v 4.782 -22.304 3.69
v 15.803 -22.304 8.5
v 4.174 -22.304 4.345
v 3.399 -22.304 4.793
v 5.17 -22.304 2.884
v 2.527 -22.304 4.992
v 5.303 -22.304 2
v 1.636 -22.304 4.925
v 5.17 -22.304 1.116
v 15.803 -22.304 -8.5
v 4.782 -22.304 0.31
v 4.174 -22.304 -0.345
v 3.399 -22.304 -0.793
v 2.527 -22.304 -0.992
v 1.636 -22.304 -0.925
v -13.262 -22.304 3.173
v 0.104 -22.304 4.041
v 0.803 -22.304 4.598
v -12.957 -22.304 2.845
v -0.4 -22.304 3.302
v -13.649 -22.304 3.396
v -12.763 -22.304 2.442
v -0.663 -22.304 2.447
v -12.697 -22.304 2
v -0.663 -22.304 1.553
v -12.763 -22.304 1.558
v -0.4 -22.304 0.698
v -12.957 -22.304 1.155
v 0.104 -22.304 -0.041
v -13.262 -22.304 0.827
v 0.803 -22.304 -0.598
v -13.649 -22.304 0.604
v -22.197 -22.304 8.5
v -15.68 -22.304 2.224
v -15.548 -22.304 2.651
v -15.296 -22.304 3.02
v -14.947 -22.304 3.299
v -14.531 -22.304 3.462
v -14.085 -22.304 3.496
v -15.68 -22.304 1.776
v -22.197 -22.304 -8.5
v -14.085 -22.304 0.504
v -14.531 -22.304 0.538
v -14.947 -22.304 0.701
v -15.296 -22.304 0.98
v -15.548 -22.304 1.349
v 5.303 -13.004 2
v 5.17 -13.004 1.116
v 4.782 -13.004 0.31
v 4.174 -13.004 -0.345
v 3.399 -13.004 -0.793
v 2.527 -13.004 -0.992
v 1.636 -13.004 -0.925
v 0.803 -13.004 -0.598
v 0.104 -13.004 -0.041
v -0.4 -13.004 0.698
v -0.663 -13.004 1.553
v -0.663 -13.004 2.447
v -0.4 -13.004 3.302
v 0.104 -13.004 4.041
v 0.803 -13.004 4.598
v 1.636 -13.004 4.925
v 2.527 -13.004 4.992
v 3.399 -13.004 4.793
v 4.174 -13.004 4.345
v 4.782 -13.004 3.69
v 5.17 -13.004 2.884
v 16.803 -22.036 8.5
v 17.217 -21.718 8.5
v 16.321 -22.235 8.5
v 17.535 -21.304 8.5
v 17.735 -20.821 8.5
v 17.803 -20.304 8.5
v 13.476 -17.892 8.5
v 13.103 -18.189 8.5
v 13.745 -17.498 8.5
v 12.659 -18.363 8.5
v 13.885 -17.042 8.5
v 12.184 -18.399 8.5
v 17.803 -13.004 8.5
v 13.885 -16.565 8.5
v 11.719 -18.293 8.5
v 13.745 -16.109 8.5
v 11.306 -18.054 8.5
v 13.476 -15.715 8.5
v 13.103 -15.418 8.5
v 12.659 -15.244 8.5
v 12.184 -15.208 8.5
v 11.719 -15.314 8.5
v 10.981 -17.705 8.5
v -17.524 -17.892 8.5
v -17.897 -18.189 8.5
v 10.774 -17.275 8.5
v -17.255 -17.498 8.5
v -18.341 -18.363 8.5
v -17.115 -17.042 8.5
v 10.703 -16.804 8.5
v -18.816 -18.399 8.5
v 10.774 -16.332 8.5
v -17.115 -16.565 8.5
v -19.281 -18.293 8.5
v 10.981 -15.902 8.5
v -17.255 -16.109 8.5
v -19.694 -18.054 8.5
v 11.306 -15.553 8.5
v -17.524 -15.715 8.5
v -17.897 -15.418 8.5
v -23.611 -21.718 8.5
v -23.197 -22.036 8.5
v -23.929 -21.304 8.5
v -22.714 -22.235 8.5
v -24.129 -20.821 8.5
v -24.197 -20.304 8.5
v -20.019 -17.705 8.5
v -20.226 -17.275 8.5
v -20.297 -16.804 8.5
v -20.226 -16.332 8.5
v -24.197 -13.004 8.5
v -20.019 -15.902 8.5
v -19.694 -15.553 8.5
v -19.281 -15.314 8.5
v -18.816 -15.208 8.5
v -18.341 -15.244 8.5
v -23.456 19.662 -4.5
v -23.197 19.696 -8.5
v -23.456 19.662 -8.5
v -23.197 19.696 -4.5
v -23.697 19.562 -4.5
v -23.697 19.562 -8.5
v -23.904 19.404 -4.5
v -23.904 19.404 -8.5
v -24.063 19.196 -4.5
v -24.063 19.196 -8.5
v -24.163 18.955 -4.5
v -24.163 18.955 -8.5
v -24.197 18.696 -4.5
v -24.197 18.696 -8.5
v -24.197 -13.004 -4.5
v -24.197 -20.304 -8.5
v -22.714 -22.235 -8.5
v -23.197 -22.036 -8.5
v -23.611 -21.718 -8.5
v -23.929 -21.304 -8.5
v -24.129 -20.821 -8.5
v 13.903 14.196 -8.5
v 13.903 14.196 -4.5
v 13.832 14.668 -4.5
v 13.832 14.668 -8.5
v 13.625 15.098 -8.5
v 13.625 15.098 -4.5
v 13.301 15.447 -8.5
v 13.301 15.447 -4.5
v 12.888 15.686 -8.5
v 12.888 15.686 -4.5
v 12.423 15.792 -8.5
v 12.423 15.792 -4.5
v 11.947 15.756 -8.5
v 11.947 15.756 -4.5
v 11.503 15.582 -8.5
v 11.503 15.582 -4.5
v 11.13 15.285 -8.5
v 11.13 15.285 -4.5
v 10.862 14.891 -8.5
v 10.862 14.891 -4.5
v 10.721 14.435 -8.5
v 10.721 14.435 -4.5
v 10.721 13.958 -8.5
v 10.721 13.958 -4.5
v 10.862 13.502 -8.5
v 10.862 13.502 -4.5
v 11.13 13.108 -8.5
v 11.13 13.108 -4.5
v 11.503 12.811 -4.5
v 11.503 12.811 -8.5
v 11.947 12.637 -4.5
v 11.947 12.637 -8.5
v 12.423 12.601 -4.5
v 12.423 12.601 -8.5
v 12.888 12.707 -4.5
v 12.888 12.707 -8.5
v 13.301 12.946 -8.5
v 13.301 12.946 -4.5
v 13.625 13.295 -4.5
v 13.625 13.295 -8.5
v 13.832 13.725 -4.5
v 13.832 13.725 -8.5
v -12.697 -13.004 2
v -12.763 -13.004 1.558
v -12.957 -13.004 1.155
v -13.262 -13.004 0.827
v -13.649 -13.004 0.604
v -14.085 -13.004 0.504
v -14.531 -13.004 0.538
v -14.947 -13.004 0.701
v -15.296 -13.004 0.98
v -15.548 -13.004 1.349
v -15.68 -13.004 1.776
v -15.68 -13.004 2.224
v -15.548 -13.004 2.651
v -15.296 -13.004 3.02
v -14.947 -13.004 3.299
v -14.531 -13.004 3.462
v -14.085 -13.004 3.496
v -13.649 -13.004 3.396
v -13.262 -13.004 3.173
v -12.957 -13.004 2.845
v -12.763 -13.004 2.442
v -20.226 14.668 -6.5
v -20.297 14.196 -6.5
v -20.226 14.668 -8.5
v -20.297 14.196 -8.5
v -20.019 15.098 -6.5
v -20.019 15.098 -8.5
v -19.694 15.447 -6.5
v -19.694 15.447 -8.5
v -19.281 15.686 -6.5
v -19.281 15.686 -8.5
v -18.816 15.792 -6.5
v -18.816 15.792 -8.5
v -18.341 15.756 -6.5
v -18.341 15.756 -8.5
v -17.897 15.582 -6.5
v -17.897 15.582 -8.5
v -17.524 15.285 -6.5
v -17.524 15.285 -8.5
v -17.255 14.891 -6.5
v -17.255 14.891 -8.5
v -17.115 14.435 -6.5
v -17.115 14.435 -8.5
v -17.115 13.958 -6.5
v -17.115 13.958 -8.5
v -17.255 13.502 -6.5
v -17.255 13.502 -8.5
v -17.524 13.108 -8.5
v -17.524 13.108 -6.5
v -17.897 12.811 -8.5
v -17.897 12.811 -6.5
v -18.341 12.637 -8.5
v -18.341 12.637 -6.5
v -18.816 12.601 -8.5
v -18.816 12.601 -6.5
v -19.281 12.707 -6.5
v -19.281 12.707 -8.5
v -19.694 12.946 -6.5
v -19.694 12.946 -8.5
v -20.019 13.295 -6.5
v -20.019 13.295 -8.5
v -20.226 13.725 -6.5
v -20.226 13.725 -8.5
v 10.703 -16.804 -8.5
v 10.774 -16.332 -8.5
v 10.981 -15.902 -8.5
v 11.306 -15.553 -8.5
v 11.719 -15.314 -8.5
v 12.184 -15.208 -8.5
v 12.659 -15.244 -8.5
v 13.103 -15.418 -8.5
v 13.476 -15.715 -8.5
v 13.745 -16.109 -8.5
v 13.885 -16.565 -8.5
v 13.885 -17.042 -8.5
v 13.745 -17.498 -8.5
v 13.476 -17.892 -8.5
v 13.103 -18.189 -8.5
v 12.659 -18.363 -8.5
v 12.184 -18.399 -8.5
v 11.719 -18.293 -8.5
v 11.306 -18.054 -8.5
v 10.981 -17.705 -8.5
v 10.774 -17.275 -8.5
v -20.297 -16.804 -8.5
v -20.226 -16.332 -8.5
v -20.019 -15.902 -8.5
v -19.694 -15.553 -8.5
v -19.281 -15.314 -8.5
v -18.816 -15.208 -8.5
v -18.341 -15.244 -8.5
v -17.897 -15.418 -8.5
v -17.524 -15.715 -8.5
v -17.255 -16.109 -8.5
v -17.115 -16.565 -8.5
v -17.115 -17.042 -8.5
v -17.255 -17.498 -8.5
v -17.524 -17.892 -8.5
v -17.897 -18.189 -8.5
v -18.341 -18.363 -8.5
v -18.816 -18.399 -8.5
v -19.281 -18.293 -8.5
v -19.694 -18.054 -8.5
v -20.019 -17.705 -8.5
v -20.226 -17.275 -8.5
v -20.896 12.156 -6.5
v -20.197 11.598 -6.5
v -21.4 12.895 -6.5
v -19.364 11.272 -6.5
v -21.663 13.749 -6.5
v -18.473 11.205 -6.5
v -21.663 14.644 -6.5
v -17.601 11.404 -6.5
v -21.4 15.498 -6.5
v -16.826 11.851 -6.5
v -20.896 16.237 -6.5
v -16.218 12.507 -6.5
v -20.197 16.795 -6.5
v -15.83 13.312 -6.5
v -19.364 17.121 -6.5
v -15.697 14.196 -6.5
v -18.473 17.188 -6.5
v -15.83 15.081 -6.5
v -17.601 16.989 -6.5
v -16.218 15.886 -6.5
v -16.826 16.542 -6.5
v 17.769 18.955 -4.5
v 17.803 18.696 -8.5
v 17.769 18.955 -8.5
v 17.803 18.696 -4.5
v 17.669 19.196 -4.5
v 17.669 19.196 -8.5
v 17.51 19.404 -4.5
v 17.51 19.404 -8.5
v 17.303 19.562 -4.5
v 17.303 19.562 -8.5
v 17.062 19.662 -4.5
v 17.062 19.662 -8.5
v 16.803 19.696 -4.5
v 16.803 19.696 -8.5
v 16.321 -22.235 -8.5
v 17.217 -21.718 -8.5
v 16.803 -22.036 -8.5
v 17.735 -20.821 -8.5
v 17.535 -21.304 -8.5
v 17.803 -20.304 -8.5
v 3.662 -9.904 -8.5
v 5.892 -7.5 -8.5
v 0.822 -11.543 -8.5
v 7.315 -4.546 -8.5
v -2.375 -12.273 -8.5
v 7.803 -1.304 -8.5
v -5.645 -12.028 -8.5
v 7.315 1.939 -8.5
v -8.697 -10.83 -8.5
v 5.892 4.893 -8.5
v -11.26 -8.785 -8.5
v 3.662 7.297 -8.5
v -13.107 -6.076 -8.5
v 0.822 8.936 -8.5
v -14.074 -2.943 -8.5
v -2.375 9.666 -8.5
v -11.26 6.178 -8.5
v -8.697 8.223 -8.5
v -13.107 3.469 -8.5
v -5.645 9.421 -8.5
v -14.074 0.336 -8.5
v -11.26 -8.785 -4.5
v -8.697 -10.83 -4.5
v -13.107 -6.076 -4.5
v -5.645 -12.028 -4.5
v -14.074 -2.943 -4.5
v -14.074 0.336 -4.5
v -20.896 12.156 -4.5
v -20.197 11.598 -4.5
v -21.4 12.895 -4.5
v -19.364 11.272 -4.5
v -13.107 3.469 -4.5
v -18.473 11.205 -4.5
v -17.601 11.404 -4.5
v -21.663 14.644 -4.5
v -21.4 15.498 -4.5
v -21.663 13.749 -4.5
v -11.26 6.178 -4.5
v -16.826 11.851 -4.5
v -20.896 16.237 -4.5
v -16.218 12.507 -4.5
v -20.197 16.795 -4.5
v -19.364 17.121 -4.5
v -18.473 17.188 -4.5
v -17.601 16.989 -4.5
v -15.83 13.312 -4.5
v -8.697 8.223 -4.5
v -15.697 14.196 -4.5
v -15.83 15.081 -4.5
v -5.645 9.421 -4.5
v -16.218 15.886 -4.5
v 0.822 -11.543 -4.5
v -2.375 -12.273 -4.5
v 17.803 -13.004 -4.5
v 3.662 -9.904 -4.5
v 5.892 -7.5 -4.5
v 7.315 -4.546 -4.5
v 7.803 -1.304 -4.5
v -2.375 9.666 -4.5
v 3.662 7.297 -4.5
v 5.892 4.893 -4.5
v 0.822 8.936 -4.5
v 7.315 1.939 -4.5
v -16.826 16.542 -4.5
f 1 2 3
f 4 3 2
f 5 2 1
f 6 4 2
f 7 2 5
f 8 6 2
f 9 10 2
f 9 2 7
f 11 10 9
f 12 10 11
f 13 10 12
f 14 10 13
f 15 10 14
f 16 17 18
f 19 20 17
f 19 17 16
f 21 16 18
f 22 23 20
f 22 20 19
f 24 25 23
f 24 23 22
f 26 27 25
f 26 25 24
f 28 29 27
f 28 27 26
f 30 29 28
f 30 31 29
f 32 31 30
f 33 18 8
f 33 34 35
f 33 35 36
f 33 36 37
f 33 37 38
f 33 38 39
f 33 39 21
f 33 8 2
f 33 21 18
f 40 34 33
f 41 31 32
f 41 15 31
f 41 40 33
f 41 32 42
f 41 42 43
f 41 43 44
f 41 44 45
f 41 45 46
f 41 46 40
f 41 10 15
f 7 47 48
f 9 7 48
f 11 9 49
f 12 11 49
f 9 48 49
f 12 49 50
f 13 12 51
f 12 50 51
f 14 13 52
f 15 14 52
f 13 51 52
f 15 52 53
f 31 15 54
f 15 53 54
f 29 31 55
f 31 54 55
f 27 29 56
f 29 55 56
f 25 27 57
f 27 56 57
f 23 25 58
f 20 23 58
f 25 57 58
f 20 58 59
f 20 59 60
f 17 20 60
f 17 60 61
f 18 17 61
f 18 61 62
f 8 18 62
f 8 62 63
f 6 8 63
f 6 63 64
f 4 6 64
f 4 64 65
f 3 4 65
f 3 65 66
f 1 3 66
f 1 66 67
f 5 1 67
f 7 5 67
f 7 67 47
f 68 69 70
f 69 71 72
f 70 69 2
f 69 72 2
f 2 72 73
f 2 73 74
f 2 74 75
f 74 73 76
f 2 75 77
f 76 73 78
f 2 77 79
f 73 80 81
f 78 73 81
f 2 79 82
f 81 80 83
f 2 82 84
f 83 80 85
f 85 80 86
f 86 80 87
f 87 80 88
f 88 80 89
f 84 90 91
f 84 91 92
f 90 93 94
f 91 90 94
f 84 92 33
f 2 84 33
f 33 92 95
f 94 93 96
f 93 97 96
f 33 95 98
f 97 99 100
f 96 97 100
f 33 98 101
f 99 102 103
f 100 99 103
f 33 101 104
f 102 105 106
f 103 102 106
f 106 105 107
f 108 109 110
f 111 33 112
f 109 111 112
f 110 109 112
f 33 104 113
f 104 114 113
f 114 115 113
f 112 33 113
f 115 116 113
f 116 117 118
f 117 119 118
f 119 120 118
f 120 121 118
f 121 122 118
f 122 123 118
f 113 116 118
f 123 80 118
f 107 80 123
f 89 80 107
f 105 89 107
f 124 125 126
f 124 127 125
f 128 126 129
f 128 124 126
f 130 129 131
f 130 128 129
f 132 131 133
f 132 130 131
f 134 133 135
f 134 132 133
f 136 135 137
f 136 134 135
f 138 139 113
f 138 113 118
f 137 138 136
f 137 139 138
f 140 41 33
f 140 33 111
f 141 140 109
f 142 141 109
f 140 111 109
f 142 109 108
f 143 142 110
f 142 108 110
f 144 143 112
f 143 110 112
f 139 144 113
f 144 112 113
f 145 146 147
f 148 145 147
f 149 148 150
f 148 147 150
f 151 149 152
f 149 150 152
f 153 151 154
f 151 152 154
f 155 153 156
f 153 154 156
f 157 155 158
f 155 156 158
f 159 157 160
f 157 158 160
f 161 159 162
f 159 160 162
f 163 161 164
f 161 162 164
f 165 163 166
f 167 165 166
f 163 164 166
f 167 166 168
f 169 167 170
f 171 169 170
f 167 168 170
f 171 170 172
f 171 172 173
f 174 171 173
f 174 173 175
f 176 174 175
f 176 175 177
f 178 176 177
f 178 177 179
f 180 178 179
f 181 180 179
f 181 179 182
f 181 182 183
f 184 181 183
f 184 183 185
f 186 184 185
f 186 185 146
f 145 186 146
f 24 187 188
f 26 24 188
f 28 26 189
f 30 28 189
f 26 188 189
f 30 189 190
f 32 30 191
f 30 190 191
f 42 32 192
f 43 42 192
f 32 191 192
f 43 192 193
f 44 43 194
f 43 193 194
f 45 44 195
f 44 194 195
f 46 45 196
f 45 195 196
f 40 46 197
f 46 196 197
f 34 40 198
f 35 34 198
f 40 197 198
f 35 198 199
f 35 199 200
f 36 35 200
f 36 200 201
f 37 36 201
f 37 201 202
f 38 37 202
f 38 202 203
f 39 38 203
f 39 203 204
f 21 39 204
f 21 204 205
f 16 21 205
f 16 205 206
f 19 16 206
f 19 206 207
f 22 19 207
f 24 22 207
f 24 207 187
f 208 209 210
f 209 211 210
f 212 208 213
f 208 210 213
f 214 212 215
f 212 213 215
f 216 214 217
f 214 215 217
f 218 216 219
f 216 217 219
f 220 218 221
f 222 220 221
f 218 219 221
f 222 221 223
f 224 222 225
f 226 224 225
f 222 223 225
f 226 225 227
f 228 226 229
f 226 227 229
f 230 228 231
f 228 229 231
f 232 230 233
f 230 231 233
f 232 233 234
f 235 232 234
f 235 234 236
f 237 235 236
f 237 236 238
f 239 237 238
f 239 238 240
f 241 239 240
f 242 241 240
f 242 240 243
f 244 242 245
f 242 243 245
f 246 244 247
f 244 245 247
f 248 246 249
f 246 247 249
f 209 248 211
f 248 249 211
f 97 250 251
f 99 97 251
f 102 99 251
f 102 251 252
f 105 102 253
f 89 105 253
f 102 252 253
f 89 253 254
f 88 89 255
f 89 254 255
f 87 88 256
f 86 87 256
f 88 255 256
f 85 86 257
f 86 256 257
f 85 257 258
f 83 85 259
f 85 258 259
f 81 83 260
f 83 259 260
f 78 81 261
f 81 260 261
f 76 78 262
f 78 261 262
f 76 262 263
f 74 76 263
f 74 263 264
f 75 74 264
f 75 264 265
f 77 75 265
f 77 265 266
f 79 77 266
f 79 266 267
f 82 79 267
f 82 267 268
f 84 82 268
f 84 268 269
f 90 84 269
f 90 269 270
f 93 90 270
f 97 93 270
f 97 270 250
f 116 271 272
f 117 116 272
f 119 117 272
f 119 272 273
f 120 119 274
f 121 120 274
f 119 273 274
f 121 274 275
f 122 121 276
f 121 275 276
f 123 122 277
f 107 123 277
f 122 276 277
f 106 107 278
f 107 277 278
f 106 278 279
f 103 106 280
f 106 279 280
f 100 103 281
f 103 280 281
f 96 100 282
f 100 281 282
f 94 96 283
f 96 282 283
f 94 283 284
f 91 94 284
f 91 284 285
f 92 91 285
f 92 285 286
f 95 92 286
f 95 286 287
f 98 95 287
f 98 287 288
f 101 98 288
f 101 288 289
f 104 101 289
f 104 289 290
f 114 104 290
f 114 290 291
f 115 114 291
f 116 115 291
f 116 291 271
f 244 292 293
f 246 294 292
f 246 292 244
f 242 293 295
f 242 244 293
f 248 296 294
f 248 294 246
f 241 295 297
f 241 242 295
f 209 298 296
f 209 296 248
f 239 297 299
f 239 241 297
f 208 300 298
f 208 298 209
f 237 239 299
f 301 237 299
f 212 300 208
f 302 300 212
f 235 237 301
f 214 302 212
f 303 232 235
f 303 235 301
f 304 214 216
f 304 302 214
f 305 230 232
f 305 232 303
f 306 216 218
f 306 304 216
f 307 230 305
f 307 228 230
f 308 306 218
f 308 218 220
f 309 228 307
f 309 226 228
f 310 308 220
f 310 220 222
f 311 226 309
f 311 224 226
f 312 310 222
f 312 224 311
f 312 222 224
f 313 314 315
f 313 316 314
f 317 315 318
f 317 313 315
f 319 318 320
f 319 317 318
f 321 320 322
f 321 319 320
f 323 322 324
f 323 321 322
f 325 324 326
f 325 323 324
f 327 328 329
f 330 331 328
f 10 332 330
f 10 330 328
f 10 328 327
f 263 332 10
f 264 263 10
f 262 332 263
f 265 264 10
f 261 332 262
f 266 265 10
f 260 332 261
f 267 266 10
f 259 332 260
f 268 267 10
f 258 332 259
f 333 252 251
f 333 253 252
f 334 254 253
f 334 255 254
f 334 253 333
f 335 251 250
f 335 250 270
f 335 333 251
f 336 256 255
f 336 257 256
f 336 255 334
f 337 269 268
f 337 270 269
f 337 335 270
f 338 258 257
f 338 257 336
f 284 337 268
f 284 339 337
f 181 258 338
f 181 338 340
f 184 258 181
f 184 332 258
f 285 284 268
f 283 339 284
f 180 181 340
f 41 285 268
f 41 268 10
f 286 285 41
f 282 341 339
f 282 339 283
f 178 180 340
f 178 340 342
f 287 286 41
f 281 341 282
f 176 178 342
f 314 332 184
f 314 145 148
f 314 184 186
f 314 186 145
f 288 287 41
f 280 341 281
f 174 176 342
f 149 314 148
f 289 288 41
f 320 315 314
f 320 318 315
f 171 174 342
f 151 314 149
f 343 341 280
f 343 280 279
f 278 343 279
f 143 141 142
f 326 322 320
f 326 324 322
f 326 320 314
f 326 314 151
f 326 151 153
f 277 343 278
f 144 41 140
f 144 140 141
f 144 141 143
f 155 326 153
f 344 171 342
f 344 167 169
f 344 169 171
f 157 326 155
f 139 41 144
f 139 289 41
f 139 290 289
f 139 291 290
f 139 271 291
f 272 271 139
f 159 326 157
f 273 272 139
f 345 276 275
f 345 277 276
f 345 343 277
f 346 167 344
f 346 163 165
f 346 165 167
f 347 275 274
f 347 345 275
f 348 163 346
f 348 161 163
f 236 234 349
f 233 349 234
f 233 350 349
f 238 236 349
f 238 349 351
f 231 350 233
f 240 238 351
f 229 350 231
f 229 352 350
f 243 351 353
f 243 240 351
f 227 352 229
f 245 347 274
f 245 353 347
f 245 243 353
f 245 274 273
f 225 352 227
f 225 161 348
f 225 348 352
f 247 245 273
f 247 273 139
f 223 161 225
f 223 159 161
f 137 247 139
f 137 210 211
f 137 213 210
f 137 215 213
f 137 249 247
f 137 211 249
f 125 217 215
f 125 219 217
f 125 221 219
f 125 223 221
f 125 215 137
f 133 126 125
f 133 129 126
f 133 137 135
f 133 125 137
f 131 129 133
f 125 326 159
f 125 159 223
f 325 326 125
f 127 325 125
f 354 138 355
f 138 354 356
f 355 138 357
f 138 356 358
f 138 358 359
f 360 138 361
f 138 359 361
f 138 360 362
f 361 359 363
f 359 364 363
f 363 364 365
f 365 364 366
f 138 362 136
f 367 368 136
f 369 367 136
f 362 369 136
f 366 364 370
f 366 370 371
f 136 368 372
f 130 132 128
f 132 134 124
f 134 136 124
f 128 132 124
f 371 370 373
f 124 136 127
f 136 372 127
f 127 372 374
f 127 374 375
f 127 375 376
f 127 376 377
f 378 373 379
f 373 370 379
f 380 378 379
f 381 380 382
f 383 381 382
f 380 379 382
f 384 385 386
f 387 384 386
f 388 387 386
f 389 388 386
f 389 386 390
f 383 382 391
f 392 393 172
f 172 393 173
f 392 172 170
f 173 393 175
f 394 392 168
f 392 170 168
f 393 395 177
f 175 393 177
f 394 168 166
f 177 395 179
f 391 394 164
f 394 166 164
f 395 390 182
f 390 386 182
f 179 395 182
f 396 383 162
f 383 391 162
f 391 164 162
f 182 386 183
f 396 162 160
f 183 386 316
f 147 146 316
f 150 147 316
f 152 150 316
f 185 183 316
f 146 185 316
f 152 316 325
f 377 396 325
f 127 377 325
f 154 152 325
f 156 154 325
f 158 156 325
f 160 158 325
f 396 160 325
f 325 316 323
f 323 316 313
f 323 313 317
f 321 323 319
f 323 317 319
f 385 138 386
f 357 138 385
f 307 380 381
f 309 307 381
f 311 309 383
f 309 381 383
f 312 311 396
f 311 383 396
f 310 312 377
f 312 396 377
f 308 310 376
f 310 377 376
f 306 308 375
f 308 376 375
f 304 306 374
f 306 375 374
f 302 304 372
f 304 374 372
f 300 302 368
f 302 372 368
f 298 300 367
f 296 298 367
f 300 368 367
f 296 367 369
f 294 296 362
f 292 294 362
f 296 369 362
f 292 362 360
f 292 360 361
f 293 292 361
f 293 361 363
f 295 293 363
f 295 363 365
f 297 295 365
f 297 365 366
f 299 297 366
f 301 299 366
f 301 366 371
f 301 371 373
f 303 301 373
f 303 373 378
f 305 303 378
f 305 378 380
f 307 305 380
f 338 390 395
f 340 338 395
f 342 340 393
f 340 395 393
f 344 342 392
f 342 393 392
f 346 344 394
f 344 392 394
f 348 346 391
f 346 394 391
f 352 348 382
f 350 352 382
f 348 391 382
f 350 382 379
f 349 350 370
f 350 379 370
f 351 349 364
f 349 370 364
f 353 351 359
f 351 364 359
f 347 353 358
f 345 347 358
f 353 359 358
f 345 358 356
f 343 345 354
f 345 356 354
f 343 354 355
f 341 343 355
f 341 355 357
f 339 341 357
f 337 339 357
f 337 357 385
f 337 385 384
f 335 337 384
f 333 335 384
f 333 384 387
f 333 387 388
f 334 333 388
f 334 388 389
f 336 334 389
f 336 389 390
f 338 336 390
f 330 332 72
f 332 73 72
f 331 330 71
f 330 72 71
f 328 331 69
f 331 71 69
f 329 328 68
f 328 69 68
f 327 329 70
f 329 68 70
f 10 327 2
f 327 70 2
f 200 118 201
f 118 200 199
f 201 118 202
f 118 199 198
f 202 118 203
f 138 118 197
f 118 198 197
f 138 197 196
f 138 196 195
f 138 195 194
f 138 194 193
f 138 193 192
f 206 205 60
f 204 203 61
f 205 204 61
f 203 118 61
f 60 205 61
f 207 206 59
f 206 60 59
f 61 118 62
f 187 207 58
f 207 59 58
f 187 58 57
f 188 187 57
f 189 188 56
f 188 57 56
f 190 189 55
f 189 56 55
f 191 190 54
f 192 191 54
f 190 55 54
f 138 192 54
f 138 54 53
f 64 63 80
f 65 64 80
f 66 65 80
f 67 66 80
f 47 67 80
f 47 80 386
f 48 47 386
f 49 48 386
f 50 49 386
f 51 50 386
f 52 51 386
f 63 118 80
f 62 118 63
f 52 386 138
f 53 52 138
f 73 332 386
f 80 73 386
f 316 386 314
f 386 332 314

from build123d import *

# Parameters (mm, degrees)
SKETCH1_W                                        = 42
SKETCH1_H                                        = 42
BOSS_EXTRUDE1_DEPTH                              = 17
SKETCH2_W                                        = 13
SKETCH2_H                                        = 32.7
CUT_EXTRUDE1_DEPTH                               = 49.30836175
F_22_0_22_DIAMETER_HOLE1_D                       = 22
F_22_0_22_DIAMETER_HOLE1_DEPTH                   = 17
F_3_2_3_2_DIAMETER_HOLE1_D                       = 3.2
F_3_2_3_2_DIAMETER_HOLE1_DEPTH                   = 17
F_3_2_3_2_DIAMETER_HOLE2_D                       = 3.2
F_6_0_6_DIAMETER_HOLE1_D                         = 6
F_6_0_6_DIAMETER_HOLE1_DEPTH                     = 42
F_3_0_3_DIAMETER_HOLE1_D                         = 3
F_3_0_3_DIAMETER_HOLE1_DEPTH                     = 42
CBORE_FOR_M3_HEX_HEAD_MACHINE_SCREW1_D           = 3.2
CBORE_FOR_M3_HEX_HEAD_MACHINE_SCREW1_CBORE_D     = 6
CBORE_FOR_M3_HEX_HEAD_MACHINE_SCREW1_CBORE_DEPTH = 2
FILLET1_R                                        = 1
FILLET2_R                                        = 2


with BuildPart() as part:
    # Sketch1 → Boss-Extrude1 (new body)
    with BuildSketch(Plane(origin=(0, 0, -8.5), x_dir=(-1, 0, 0), z_dir=(0, 0, -1))):
        with Locations((3.196772144, -1.303538171)):
            Rectangle(SKETCH1_W, SKETCH1_H)
    extrude(amount=-BOSS_EXTRUDE1_DEPTH)

    # Sketch2 → Cut-Extrude1 (cut, through all)
    with BuildSketch(Plane(origin=(17.803227856, 0, 0), x_dir=(0, 0, -1), z_dir=(1, 0, 0))):
        with Locations((-2, 3.346461829)):
            Rectangle(SKETCH2_W, SKETCH2_H)
    extrude(amount=-CUT_EXTRUDE1_DEPTH, mode=Mode.SUBTRACT)

    # Ø22.0 (22) Diameter Hole1
    with Locations(Plane(origin=(0, 0, -8.5), x_dir=(-1, 0, 0), z_dir=(0, 0, -1))):
        with Locations((3.196772144, -1.303538171)):
            Hole(F_22_0_22_DIAMETER_HOLE1_D / 2, depth=F_22_0_22_DIAMETER_HOLE1_DEPTH)

    # Ø3.2 (3.2) Diameter Hole1
    with Locations(Plane(origin=(0, 0, -8.5), x_dir=(-1, 0, 0), z_dir=(0, 0, -1))):
        with Locations((-12.303227856, 14.196461829)):
            Hole(F_3_2_3_2_DIAMETER_HOLE1_D / 2, depth=F_3_2_3_2_DIAMETER_HOLE1_DEPTH)

    # Ø3.2 (3.2) Diameter Hole2 (through all)
    with Locations(Plane.XY.offset(8.5)):
        with Locations((-18.696772144, -16.803538171), (12.303227856, -16.803538171)):
            Hole(F_3_2_3_2_DIAMETER_HOLE2_D / 2)

    # Ø6.0 (6) Diameter Hole1
    with Locations(Plane(origin=(0, -22.303538171, 0), x_dir=(-1, 0, 0), z_dir=(0, -1, 0))):
        with Locations((-2.303227856, -2)):
            Hole(F_6_0_6_DIAMETER_HOLE1_D / 2, depth=F_6_0_6_DIAMETER_HOLE1_DEPTH)

    # Ø3.0 (3) Diameter Hole1
    with Locations(Plane(origin=(0, -22.303538171, 0), x_dir=(-1, 0, 0), z_dir=(0, -1, 0))):
        with Locations((14.196772144, -2)):
            Hole(F_3_0_3_DIAMETER_HOLE1_D / 2, depth=F_3_0_3_DIAMETER_HOLE1_DEPTH)

    # CBORE for M3 Hex Head Machine Screw1 (through all)
    with Locations(Plane.XY.offset(-4.5)):
        with Locations((-18.696772144, 14.196461829)):
            CounterBoreHole(CBORE_FOR_M3_HEX_HEAD_MACHINE_SCREW1_D / 2, CBORE_FOR_M3_HEX_HEAD_MACHINE_SCREW1_CBORE_D / 2, CBORE_FOR_M3_HEX_HEAD_MACHINE_SCREW1_CBORE_DEPTH)

    # Fillet1
    fillet1_edges = [part.edges().sort_by_distance(p)[0] for p in [
        (-24.196772144, 19.696461829, -6.5),
        (17.803227856, 19.696461829, -6.5),
    ]]
    fillet(fillet1_edges, radius=FILLET1_R)

    # Fillet2
    fillet2_edges = [part.edges().sort_by_distance(p)[0] for p in [
        (17.803227856, -22.303538171, 0),
        (-24.196772144, -22.303538171, 0),
    ]]
    fillet(fillet2_edges, radius=FILLET2_R)


solid = part.part
